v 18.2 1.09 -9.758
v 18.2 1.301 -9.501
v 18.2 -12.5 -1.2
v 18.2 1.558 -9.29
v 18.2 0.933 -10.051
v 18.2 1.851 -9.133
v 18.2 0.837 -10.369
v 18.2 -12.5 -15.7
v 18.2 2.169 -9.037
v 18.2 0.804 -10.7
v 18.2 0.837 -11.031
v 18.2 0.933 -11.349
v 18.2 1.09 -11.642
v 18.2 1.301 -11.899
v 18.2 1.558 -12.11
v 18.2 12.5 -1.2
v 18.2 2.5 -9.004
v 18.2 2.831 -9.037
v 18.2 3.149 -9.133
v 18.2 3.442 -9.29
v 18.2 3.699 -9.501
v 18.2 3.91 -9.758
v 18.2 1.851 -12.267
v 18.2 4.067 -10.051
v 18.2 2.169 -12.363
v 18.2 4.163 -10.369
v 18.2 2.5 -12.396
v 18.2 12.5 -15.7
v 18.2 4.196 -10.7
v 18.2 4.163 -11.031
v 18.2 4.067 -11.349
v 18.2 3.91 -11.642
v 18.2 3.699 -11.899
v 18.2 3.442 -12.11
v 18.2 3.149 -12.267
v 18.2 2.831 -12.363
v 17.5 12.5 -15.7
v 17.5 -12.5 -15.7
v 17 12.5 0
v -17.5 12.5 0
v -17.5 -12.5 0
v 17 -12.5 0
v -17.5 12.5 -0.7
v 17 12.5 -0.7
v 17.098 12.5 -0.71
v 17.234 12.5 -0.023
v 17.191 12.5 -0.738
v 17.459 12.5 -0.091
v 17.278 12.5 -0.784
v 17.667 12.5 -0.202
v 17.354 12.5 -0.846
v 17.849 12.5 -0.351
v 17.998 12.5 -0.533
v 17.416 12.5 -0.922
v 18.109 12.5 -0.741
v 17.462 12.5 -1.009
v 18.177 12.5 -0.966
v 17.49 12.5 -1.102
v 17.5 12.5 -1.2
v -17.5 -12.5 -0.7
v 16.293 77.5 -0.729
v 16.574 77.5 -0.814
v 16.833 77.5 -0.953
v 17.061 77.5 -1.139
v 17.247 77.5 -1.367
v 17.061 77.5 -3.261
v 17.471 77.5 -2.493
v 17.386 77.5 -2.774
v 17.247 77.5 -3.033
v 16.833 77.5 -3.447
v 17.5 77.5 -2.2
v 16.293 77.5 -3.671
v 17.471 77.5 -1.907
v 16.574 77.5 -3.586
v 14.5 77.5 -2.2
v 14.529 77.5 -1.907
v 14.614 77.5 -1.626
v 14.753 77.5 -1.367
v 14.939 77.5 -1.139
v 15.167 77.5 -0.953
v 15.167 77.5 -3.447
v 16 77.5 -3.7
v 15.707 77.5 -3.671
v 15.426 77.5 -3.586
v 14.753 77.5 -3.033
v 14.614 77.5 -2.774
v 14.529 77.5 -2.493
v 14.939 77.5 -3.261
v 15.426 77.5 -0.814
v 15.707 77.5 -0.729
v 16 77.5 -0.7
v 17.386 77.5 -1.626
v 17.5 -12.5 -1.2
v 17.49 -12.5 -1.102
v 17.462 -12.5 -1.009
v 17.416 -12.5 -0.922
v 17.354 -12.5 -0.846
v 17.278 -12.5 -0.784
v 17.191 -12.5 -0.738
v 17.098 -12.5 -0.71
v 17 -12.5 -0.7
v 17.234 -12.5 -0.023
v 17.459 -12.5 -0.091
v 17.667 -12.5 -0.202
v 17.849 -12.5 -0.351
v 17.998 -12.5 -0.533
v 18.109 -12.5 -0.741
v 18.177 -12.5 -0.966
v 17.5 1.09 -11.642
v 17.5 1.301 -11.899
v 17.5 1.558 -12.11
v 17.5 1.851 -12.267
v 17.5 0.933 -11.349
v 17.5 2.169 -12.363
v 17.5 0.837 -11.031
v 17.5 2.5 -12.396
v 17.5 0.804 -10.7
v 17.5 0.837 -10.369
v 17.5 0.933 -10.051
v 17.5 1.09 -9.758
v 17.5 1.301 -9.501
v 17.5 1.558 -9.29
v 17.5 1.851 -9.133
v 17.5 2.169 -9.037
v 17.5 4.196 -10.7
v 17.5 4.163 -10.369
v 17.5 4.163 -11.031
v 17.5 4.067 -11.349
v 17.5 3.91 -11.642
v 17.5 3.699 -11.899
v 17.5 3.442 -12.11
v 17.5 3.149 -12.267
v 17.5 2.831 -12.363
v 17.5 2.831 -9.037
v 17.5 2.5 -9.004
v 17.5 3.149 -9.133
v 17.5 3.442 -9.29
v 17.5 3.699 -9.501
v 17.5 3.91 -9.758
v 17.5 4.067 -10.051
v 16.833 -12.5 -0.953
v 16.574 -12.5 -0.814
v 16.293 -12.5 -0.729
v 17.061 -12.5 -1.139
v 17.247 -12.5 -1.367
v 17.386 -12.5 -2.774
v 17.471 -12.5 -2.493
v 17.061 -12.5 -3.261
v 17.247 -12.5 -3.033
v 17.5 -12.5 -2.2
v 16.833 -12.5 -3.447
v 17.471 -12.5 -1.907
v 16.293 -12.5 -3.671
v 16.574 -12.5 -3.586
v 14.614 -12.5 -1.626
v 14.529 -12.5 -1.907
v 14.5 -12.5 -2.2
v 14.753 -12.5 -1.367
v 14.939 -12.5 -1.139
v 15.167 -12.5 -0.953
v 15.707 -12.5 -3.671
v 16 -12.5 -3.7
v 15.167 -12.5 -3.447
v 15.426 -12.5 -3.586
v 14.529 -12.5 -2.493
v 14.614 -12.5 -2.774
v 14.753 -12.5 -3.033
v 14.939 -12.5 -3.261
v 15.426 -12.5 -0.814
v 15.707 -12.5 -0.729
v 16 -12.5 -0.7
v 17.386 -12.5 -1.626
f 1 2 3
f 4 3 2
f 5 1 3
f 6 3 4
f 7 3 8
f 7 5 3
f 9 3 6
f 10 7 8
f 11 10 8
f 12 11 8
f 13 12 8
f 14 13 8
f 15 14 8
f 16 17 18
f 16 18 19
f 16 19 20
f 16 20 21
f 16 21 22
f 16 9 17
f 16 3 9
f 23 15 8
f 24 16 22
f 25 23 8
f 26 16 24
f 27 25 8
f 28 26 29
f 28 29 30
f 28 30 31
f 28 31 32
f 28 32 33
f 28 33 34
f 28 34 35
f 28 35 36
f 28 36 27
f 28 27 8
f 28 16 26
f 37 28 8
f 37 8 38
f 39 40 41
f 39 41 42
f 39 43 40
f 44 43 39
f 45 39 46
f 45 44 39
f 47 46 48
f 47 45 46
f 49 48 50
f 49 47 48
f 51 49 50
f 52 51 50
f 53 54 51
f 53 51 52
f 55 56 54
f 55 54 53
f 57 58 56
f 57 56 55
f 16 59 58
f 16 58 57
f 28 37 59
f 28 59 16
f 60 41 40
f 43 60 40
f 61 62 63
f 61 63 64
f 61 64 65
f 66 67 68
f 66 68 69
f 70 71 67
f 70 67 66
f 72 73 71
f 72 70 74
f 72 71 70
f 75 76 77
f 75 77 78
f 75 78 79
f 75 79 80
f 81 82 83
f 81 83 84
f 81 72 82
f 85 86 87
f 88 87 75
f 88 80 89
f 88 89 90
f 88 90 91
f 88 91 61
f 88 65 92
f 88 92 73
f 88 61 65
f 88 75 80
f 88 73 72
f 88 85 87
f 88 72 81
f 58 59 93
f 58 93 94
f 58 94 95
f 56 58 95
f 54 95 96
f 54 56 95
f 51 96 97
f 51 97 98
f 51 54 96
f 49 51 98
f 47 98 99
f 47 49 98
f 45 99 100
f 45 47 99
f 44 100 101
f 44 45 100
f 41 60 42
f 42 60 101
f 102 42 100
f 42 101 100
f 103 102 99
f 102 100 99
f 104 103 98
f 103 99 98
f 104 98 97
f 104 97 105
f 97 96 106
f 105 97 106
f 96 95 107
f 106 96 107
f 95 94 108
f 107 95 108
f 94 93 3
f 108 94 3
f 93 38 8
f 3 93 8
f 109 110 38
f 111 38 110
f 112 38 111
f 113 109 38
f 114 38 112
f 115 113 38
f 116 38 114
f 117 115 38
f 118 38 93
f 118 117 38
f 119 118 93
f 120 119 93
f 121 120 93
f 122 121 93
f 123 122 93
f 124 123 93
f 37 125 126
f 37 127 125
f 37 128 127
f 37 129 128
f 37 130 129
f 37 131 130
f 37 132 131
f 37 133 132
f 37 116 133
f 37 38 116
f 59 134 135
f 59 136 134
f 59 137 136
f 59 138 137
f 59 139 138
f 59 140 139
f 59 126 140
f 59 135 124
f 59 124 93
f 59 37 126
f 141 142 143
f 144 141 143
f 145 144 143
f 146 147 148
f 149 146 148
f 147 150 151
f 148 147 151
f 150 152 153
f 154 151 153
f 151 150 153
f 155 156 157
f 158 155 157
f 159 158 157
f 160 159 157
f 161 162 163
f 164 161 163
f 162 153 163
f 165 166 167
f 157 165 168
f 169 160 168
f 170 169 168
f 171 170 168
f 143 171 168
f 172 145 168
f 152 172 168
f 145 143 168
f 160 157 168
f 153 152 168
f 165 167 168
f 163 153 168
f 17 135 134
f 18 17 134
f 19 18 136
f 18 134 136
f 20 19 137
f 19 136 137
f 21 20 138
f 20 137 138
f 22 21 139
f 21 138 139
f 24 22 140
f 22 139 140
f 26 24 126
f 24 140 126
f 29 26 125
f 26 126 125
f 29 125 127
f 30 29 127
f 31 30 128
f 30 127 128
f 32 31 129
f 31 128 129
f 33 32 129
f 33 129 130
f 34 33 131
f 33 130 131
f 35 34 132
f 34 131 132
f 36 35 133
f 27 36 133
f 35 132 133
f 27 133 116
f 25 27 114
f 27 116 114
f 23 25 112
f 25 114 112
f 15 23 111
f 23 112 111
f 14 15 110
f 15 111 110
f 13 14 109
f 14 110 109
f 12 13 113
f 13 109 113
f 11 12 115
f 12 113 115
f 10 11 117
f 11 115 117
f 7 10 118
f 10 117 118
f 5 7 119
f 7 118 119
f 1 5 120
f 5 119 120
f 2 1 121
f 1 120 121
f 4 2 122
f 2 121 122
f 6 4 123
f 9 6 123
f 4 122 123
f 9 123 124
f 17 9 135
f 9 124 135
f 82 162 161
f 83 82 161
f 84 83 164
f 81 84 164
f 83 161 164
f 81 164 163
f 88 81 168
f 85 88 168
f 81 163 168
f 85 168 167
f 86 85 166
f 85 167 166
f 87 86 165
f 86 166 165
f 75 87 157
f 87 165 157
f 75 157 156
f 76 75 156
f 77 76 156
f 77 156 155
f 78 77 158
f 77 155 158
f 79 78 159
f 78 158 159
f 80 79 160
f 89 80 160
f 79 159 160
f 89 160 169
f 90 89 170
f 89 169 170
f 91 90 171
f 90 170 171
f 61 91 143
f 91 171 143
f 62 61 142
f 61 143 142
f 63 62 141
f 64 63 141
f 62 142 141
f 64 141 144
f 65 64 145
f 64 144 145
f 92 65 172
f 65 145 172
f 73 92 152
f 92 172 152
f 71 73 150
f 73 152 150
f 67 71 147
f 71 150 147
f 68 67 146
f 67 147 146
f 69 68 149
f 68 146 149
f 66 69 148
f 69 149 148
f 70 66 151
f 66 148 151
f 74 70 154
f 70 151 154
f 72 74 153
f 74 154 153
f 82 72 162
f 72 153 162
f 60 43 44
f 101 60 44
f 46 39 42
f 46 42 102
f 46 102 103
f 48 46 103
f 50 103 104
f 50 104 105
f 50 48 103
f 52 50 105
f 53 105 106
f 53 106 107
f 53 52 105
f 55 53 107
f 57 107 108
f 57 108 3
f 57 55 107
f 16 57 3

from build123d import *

# Parameters (mm, degrees)
SKETCH1_W                    = 35
SKETCH1_H                    = 25
BASE_FLANGE1_DEPTH           = 0.7
SKETCH6_R                    = 1.5
BOSS_EXTRUDE1_DEPTH          = 90
EDGE_FLANGE1_STRIP_W         = 3.8
EDGE_FLANGE1_STRIP_H         = 0.7
EDGE_FLANGE1_STRIP_CUT_DEPTH = 25
EDGE_FLANGE1_DEPTH           = 25
SKETCH10_R                   = 1.695993735
CUT_EXTRUDE1_DEPTH           = 0.7


# Sheet-metal steps are written as plain solids
with BuildPart() as part:
    # Sketch1 → Base-Flange1 (new body)
    with BuildSketch(Plane.XY):
        Rectangle(SKETCH1_W, SKETCH1_H)
    extrude(amount=-BASE_FLANGE1_DEPTH)

    # Edge-Flange1 strip (across the edge) → Edge-Flange1 strip cut (cut)
    with BuildSketch(Plane(origin=(17.5, 12.5, -0.7), x_dir=(-1, 0, 0), z_dir=(0, -1, 0))):
        with Locations((-1.4, -0.35)):
            Rectangle(EDGE_FLANGE1_STRIP_W, EDGE_FLANGE1_STRIP_H)
    extrude(amount=EDGE_FLANGE1_STRIP_CUT_DEPTH, mode=Mode.SUBTRACT)

    # Edge-Flange1 section (across the edge) → Edge-Flange1 (add)
    with BuildSketch(Plane(origin=(17.5, 12.5, -0.7), x_dir=(-1, 0, 0), z_dir=(0, -1, 0))):
        with BuildLine():
            Line((-0.7, 0.5), (-0.7, 15))
            Line((-0.7, 15), (0, 15))
            Line((0, 15), (0, 0.5))
            ThreePointArc((0, 0.5), (0.146446609, 0.146446609), (0.5, 0))
            Line((0.5, 0), (0.5, -0.7))
            ThreePointArc((0.5, -0.7), (-0.348528137, -0.348528137), (-0.7, 0.5))
        make_face()
    extrude(amount=EDGE_FLANGE1_DEPTH)

    # Sketch10 → Cut-Extrude1 (cut)
    with BuildSketch(Plane.ZY.offset(-17.5)):
        with Locations((-10.7, 2.5)):
            Circle(SKETCH10_R)
    extrude(amount=-CUT_EXTRUDE1_DEPTH, mode=Mode.SUBTRACT)


with BuildPart() as body_2:
    # Sketch6 → Boss-Extrude1 (new body)
    with BuildSketch(Plane(origin=(0, -12.5, 0), x_dir=(1, 0, 0), z_dir=(0, 1, 0))):
        with Locations(Location((16, 2.2, 0), (0, 0, 90))):
            Circle(SKETCH6_R)
    extrude(amount=BOSS_EXTRUDE1_DEPTH)


solid = Compound([part.part, body_2.part])
